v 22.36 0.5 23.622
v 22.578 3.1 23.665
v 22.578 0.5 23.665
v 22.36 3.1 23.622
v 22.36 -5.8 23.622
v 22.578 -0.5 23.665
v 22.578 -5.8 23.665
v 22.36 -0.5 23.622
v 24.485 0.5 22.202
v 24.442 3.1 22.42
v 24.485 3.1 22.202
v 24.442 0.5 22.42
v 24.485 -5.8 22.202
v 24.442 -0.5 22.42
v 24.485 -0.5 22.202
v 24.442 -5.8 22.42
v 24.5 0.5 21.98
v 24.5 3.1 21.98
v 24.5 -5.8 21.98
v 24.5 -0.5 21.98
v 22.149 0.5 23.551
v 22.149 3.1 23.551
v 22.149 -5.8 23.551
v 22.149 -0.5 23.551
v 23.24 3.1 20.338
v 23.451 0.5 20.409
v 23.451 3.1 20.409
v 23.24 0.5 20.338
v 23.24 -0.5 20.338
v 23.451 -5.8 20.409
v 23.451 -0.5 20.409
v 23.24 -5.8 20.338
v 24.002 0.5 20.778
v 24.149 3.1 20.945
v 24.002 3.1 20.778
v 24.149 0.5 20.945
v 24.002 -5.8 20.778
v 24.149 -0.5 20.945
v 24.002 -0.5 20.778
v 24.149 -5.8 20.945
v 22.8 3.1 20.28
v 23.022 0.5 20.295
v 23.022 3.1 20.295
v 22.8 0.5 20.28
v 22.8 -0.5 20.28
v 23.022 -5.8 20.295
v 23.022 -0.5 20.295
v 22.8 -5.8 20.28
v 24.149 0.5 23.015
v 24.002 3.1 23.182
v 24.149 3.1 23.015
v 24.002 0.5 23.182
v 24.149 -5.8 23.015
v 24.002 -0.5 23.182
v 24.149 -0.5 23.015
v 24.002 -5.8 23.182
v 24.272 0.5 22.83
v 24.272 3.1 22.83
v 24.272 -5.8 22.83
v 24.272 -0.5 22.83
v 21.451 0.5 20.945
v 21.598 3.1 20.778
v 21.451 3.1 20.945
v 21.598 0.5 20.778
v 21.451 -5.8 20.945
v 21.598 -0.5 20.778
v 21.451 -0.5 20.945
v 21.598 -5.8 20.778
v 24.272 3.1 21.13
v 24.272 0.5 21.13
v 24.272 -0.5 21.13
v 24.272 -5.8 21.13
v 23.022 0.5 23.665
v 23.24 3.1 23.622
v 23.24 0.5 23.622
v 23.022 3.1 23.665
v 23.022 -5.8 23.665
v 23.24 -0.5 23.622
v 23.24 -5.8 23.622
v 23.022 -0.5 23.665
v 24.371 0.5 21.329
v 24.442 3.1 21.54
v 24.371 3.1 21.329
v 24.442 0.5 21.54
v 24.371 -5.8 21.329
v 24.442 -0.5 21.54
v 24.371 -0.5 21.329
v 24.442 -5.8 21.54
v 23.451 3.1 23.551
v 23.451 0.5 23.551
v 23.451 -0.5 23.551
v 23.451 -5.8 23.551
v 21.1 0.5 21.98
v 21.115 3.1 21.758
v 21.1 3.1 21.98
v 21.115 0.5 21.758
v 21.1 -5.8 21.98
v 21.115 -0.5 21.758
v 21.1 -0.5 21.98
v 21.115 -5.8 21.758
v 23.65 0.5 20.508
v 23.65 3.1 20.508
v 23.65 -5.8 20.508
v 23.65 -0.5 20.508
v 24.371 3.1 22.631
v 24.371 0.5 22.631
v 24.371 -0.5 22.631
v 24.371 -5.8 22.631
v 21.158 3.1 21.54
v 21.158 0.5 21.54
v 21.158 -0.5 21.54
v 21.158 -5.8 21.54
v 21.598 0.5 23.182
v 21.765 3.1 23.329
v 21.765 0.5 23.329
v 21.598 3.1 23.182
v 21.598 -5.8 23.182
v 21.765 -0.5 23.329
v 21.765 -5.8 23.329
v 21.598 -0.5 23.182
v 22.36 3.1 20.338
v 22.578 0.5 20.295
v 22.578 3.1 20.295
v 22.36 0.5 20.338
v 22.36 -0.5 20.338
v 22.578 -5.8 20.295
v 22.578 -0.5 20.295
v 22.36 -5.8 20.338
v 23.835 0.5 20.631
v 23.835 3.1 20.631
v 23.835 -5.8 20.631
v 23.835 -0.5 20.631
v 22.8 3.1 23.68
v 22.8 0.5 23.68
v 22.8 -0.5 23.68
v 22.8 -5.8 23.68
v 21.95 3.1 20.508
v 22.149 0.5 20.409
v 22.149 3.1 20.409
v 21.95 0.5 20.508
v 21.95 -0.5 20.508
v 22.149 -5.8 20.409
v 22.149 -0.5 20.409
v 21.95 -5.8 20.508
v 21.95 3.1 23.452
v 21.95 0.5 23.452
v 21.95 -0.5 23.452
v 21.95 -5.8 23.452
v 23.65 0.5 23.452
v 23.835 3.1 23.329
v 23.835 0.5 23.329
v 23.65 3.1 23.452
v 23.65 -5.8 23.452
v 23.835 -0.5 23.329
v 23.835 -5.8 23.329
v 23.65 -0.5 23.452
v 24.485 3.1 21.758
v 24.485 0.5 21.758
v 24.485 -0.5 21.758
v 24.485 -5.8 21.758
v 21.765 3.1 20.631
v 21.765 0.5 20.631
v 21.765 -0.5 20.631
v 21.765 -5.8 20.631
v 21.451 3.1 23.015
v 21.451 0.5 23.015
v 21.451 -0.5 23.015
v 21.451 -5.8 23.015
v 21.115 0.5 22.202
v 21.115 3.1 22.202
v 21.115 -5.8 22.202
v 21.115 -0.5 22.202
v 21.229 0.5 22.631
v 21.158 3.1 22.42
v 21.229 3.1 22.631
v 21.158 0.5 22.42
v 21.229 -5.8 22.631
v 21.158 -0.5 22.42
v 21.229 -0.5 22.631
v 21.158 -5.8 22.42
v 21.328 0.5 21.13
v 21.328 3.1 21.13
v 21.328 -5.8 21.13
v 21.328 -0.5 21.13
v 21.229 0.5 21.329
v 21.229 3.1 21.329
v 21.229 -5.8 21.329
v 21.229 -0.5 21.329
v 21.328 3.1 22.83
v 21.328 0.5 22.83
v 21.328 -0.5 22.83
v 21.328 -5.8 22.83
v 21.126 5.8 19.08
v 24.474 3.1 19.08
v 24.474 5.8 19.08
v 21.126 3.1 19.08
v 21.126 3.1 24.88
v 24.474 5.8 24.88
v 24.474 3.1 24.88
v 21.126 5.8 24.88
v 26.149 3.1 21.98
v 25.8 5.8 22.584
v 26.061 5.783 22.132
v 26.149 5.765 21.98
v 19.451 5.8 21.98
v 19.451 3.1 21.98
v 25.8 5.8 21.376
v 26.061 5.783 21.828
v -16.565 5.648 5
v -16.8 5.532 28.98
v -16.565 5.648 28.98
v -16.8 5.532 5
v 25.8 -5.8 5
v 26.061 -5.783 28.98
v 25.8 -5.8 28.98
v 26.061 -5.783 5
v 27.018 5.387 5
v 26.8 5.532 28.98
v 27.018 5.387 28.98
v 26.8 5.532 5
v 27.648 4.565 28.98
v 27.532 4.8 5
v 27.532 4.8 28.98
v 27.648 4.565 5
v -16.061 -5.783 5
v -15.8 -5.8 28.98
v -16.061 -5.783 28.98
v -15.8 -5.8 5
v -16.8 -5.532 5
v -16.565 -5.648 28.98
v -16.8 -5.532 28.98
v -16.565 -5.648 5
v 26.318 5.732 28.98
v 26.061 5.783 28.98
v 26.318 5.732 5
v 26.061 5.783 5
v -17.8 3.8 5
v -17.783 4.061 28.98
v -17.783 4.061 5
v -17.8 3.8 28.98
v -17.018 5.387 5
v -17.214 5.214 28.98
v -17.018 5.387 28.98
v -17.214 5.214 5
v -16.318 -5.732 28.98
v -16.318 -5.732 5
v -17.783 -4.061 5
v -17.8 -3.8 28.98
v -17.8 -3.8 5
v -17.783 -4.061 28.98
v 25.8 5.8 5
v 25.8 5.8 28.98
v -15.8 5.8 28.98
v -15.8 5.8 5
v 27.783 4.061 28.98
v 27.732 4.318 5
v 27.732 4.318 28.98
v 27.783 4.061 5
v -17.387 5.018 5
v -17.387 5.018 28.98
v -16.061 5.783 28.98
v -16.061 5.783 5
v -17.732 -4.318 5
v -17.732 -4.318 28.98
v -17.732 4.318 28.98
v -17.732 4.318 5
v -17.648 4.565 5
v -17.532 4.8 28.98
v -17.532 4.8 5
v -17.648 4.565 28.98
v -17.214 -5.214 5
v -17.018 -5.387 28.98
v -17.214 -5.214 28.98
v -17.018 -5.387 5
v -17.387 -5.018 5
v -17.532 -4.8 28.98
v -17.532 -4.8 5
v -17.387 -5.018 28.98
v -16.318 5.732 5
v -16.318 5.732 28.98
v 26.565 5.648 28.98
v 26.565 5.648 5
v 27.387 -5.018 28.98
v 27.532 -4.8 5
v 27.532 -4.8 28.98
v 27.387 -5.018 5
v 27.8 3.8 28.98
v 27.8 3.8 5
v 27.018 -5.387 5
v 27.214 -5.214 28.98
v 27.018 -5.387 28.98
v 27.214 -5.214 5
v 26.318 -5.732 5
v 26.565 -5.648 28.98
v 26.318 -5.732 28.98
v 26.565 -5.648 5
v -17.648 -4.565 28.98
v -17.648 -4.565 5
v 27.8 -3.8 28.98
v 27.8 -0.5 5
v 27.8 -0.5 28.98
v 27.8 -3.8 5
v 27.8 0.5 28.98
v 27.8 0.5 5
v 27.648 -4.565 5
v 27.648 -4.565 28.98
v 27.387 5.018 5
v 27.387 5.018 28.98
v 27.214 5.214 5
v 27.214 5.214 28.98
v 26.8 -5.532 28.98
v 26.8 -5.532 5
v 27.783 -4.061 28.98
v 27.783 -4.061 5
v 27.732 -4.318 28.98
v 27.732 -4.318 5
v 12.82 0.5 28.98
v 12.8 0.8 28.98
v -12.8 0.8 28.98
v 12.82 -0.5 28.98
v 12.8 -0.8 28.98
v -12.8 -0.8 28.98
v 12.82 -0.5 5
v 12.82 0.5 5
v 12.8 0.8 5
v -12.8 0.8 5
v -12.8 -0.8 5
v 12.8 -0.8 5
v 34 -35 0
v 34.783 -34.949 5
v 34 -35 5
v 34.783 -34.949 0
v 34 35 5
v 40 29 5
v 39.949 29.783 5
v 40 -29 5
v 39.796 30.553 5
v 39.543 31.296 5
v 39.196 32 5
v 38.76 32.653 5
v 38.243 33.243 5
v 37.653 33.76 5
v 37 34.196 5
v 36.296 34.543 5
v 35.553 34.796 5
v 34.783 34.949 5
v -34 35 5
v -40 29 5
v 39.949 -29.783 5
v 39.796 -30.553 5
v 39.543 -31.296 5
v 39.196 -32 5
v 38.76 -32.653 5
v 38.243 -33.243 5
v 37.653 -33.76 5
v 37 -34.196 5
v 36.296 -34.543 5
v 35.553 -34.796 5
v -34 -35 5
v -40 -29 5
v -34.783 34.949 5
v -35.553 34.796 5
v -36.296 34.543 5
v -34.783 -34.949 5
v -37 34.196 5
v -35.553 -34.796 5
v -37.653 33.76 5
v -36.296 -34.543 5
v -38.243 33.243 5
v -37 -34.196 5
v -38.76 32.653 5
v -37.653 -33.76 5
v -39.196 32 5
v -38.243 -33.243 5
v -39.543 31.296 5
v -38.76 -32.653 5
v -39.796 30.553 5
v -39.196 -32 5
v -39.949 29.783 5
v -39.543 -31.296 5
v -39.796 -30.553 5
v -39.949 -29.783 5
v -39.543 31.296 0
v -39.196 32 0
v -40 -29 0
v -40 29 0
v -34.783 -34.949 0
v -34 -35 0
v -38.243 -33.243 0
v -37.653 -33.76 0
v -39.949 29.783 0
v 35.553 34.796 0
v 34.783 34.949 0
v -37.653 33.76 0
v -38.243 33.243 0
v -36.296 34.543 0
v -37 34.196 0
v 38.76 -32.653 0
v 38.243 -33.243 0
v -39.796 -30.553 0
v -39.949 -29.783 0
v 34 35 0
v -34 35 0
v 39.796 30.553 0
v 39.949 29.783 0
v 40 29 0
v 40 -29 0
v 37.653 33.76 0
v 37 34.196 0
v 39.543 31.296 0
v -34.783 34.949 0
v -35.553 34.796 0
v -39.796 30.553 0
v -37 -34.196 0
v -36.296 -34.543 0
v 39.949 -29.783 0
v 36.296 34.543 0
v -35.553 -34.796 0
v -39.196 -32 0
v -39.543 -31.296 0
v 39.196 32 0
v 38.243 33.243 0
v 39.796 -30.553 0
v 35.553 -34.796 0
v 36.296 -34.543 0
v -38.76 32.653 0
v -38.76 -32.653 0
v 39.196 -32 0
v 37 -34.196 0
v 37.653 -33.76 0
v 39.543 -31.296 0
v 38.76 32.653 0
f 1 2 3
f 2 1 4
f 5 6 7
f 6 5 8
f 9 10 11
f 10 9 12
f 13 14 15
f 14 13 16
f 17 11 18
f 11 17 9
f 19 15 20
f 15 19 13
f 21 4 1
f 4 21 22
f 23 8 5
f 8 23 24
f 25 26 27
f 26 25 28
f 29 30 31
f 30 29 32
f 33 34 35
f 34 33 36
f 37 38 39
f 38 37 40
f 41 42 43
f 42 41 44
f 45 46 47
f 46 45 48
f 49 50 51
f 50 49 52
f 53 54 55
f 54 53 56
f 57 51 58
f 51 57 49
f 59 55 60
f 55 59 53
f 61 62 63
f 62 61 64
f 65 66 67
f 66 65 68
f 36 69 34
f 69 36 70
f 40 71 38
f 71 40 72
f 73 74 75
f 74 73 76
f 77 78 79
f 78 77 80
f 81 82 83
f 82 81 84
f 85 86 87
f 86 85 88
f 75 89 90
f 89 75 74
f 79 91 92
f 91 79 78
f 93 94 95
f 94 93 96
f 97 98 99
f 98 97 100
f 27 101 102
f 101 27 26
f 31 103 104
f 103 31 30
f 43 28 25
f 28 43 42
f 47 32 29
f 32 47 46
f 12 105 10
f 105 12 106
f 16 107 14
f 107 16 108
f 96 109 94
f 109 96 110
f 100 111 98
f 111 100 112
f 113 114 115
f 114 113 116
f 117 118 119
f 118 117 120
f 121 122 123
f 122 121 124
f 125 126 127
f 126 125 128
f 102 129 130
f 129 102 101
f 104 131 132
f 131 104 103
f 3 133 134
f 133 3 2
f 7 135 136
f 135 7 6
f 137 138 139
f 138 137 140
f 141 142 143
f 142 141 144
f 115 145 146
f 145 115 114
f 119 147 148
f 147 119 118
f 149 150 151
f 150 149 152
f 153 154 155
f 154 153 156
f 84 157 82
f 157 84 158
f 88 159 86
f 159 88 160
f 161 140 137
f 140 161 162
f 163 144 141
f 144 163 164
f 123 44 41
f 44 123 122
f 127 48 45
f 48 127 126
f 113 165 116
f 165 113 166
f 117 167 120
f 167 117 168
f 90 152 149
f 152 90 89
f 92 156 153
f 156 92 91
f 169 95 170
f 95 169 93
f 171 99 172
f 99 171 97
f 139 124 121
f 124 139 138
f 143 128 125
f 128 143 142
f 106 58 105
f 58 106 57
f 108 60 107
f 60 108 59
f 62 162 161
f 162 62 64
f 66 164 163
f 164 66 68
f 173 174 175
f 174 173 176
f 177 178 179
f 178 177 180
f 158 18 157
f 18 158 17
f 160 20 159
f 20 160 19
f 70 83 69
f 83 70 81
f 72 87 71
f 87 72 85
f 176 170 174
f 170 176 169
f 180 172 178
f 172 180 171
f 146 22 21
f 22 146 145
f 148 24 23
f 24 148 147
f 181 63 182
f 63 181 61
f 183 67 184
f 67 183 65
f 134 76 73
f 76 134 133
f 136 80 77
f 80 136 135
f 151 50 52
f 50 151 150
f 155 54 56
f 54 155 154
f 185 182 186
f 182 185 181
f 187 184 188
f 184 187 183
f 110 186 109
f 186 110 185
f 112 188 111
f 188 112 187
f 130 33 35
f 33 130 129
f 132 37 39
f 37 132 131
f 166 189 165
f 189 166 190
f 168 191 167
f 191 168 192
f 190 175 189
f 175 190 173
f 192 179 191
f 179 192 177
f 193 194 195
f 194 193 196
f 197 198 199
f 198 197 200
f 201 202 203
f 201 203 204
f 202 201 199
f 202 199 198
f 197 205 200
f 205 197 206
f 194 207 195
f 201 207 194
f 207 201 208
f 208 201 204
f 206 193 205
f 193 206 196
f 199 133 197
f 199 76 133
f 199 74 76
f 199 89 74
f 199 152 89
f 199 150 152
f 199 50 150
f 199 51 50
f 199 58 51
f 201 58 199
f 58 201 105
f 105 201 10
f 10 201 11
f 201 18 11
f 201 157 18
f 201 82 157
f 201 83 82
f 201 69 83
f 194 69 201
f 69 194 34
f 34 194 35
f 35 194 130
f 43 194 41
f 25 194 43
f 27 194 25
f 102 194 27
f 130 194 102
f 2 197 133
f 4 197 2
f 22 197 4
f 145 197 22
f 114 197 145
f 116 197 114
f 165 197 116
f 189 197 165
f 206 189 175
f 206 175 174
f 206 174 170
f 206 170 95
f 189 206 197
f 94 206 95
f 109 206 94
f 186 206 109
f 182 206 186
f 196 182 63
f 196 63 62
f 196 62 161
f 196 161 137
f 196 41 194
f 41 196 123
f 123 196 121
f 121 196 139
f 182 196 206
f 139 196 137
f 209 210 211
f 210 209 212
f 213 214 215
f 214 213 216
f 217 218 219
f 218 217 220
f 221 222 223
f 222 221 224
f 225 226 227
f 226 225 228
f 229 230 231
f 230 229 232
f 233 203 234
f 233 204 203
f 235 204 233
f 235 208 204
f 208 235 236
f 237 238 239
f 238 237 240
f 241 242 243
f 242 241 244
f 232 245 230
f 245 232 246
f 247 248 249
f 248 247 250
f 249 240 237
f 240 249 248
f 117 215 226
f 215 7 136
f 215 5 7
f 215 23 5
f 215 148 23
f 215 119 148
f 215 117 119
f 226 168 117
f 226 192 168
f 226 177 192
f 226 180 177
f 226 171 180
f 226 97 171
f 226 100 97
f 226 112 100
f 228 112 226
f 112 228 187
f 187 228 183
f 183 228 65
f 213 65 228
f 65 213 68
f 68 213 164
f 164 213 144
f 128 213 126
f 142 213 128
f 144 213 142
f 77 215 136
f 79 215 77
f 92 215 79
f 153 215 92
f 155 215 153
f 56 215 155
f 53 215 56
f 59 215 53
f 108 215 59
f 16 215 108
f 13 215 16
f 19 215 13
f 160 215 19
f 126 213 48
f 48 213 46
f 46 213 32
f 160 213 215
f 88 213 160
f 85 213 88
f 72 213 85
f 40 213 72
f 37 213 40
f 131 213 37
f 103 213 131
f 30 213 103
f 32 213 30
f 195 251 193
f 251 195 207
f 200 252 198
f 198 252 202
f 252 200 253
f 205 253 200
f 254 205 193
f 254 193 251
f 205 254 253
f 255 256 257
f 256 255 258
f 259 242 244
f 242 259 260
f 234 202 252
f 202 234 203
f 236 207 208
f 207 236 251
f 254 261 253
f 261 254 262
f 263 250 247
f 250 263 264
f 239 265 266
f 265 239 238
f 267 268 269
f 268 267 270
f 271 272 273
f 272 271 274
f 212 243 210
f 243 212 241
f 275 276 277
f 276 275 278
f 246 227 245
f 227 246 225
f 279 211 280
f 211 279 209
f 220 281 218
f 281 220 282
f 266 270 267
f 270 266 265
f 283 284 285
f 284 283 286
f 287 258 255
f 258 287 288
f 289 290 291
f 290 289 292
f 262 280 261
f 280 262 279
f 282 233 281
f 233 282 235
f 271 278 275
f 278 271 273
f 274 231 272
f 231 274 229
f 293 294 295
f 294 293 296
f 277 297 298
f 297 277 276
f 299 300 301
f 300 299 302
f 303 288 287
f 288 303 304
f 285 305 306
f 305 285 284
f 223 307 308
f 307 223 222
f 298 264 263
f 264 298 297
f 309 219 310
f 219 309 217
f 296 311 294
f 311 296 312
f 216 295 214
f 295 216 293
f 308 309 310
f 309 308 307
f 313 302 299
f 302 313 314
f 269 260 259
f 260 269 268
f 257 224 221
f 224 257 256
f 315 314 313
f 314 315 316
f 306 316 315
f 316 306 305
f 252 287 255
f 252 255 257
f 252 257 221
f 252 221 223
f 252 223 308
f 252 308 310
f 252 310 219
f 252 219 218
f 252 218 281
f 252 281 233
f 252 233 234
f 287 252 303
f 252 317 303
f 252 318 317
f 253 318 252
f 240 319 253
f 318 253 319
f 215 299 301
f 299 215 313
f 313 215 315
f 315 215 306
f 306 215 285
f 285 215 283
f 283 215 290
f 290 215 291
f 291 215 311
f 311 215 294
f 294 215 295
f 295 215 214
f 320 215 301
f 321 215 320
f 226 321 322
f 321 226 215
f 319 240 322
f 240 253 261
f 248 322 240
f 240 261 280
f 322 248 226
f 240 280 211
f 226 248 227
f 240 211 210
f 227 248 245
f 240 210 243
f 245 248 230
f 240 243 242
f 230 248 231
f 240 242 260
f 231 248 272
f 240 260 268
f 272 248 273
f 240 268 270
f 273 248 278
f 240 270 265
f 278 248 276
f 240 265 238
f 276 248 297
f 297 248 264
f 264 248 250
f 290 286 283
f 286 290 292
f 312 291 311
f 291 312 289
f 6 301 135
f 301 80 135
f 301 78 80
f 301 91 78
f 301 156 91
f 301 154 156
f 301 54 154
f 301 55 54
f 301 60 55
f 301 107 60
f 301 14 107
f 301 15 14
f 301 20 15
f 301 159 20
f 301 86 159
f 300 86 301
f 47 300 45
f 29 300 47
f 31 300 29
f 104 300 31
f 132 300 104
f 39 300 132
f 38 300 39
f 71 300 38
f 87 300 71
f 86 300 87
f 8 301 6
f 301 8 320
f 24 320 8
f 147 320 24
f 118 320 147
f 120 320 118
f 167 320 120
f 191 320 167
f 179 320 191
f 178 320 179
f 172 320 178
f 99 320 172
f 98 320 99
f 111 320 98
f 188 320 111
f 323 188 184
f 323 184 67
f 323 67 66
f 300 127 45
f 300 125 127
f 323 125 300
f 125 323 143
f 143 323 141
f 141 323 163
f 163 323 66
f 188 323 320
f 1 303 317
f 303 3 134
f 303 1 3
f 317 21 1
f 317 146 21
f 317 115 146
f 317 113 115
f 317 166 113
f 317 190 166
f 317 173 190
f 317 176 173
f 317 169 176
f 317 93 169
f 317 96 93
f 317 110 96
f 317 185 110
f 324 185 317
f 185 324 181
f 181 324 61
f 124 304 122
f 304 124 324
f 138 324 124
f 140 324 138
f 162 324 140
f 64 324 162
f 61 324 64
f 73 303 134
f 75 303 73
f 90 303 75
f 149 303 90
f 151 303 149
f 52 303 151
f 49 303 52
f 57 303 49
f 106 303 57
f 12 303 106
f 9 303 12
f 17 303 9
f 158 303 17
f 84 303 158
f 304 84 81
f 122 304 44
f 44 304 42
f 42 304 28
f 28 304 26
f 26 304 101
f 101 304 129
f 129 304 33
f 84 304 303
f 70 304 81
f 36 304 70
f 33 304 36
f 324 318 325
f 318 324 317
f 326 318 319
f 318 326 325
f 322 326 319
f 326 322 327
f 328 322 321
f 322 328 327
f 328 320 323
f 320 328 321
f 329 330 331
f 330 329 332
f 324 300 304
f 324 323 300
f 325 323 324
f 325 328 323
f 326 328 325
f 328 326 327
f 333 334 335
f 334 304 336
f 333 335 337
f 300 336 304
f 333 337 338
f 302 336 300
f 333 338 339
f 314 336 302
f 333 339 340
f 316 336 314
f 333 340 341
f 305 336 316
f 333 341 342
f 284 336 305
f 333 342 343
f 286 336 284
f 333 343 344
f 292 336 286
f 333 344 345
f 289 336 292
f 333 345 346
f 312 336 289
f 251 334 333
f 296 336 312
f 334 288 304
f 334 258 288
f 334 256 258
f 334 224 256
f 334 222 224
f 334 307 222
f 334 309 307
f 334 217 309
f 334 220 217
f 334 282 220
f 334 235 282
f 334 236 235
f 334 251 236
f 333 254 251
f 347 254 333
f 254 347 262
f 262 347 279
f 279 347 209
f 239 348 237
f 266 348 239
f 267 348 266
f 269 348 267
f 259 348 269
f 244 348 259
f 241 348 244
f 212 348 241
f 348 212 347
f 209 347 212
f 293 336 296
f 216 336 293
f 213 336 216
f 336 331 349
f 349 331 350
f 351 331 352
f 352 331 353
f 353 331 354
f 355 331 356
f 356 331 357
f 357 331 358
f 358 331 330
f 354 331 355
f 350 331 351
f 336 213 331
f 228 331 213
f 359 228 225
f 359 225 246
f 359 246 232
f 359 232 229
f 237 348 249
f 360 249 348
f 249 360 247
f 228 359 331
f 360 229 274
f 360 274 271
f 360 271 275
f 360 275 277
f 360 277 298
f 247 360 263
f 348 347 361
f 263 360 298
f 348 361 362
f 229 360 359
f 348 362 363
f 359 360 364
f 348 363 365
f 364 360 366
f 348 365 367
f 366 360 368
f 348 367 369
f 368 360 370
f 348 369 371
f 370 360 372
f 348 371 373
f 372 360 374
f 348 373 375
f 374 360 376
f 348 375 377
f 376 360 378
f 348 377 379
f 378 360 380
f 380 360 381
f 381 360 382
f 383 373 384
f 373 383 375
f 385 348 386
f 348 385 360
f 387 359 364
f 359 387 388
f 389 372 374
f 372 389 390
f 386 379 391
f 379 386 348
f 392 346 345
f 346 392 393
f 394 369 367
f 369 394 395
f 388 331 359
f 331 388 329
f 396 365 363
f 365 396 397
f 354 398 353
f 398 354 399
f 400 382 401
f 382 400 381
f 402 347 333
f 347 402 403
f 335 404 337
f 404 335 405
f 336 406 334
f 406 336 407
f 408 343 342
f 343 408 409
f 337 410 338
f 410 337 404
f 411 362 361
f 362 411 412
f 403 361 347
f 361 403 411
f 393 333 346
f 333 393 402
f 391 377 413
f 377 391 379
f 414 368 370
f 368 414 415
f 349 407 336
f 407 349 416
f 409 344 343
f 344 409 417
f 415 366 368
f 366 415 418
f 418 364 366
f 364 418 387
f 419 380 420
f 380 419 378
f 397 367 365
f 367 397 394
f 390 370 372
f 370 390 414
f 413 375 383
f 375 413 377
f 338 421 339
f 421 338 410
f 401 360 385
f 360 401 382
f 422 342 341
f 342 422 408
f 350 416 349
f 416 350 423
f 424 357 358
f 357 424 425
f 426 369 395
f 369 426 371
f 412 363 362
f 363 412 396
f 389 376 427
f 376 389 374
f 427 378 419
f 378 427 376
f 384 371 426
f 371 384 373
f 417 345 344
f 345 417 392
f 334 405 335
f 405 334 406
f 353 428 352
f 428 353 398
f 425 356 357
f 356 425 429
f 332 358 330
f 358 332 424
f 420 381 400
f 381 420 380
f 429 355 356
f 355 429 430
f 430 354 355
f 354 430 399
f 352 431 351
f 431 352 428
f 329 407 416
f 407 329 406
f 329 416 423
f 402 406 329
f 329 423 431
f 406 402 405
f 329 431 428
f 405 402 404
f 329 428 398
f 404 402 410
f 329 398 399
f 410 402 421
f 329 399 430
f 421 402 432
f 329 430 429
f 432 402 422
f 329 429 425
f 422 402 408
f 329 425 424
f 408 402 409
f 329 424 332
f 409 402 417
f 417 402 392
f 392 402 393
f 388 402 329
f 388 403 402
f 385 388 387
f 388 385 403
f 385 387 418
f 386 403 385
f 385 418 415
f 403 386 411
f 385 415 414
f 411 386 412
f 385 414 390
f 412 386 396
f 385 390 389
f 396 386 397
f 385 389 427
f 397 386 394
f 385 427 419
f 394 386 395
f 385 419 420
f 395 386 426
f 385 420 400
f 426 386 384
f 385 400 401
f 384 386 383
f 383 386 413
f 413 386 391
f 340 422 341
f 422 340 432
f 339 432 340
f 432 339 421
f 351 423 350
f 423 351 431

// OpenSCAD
// Example dimensions only; measure the ruler, screws and nuts before printing.
// Units: mm. The ruler's readable scale faces -Y; its length runs along +Z.
part = "foot"; // foot, cursor, socket_coupon
ruler_width = 25;
ruler_thickness = 1;
ruler_length = 150;
socket_clearance = 0.30; // per side, before clamping
cursor_clearance = 0.35; // per side, before clamping
socket_engagement = 24;
minimum_ruler_engagement = 16; // actual insertion; example allows at most 8 mm lift
minimum_exposed_scale = 80;
base_width = 80;
base_depth = 70;
base_thickness = 5;
base_corner_radius = 6;
socket_wall = 5;
socket_corner_radius = 2;
ear_extension = 10;
split_gap = 1.0;
socket_screw_height = 17; // above base top
cursor_height = 12;
cursor_wall = 4.2;
cursor_edge_width = 2;
cursor_reference_offset = 1.2; // lower window edge above cursor bottom
cursor_top_beam = 1.8;
screw_hole_diameter = 3.4;
nut_across_flats = 5.8;
nut_depth = 2.7;
minimum_wall = 1.2;
coupon_margin = 2;
coupon_base_thickness = 3;
show_reference = false; // background ruler excluded from STL
epsilon = 0.02;
$fn = 48;

socket_slot_width = ruler_width + 2 * socket_clearance;
socket_slot_thickness = ruler_thickness + 2 * socket_clearance;
socket_depth = socket_slot_thickness + 2 * socket_wall;
socket_left = -socket_slot_width/2 - socket_wall;
socket_right = socket_slot_width/2 + socket_wall + ear_extension;
socket_screw_x = socket_slot_width/2 + socket_wall + ear_extension/2;
cursor_slot_width = ruler_width + 2 * cursor_clearance;
cursor_slot_thickness = ruler_thickness + 2 * cursor_clearance;
cursor_depth = cursor_slot_thickness + 2 * cursor_wall;
cursor_left = -cursor_slot_width/2 - cursor_wall;
cursor_right = cursor_slot_width/2 + cursor_wall + ear_extension;
cursor_screw_x = cursor_slot_width/2 + cursor_wall + ear_extension/2;
nut_radius = nut_across_flats / sqrt(3);
cursor_window_width = cursor_slot_width - 2 * cursor_edge_width;

assert(part == "foot" || part == "cursor" || part == "socket_coupon", "Unknown part selector");
assert(ruler_width > 0 && ruler_thickness > 0 && ruler_length > 0,
       "Ruler dimensions must be positive");
assert(socket_clearance >= 0 && cursor_clearance >= 0,
       "Fit clearances must be nonnegative");
assert(minimum_wall >= 1 && socket_wall >= nut_depth + minimum_wall &&
       cursor_wall >= nut_depth + minimum_wall, "Walls must retain nut pocket material");
assert(screw_hole_diameter > 0 && nut_depth > 0 &&
       nut_across_flats >= screw_hole_diameter + 2 * minimum_wall,
       "Nut capture must surround screw hole");
assert(ear_extension/2 >= nut_radius + minimum_wall,
       "Clamp ears must surround nut pocket");
assert(split_gap > 2 * max(socket_clearance, cursor_clearance) &&
       split_gap <= min(socket_slot_thickness, cursor_slot_thickness),
       "Split gap must join slots with bounded closure travel");
assert(socket_engagement >= 2 * (nut_radius + minimum_wall) &&
       socket_screw_height >= nut_radius + minimum_wall &&
       socket_engagement - socket_screw_height >= nut_radius + minimum_wall,
       "Socket engagement must retain screw margins");
assert(minimum_ruler_engagement <= socket_engagement &&
       minimum_ruler_engagement >= socket_engagement - socket_screw_height + nut_radius + minimum_wall,
       "Minimum insertion must cover clamping screw station");
assert(minimum_exposed_scale > 0 && ruler_length - socket_engagement >= minimum_exposed_scale,
       "Ruler must leave required exposed scale");
assert(base_thickness >= minimum_wall && base_width/2 >= max(-socket_left, socket_right) + minimum_wall &&
       base_depth/2 >= socket_depth/2 + minimum_wall,
       "Base must support socket with positive margins");
assert(base_corner_radius > 0 && base_corner_radius < min(base_width, base_depth)/2 &&
       socket_corner_radius > 0 && socket_corner_radius <= minimum_wall + 1,
       "Corner radii must preserve socket and base");
assert(cursor_height/2 >= nut_radius + minimum_wall &&
       cursor_reference_offset >= minimum_wall && cursor_top_beam >= minimum_wall &&
       cursor_height - cursor_reference_offset - cursor_top_beam >= 2 * minimum_wall &&
       cursor_edge_width >= minimum_wall && cursor_window_width >= 2 * minimum_wall,
       "Cursor window must preserve reference edge and screw margins");
assert(coupon_margin >= minimum_wall && coupon_base_thickness >= minimum_wall,
       "Coupon base must retain positive margins");

module rounded_block(width, depth, height, radius) {
    assert(width > 2*radius && depth > 2*radius,
           "Rounded block must retain positive inner profile");
    linear_extrude(height)
        offset(r=radius)
            square([width - 2*radius, depth - 2*radius], center=true);
}

// Both screws pull opposing jaws together outside the ruler envelope.
// Rear-face hex pocket is open for nut insertion/removal; front head stays exposed.
module clamp_hardware_voids(x, depth, z) {
    translate([x, 0, z]) rotate([90, 0, 0])
        cylinder(h=depth + 2*epsilon, d=screw_hole_diameter, center=true);
    translate([x, depth/2 - nut_depth/2 + epsilon/2, z]) rotate([90, 0, 0])
        cylinder(h=nut_depth + epsilon, r=nut_radius, $fn=6, center=true);
}

// A small transition bevel avoids collinear floor facets at the slot/split
// junction. It only relieves the off-ruler edge of the aperture.
module ruler_aperture(width, thickness, right, height) {
    translate([0, 0, -epsilon])
        linear_extrude(height + 2*epsilon)
            if (split_gap == thickness) {
                translate([-width/2, -thickness/2])
                    square([right + epsilon + width/2, thickness]);
            } else {
                polygon([
                    [-width/2, -thickness/2], [width/2, -thickness/2],
                    [width/2 + epsilon, -split_gap/2], [right + epsilon, -split_gap/2],
                    [right + epsilon, split_gap/2], [width/2 + epsilon, split_gap/2],
                    [width/2, thickness/2], [-width/2, thickness/2]
                ]);
            }
}

module socket() {
    difference() {
        translate([(socket_left + socket_right)/2, 0, 0])
            rounded_block(socket_right - socket_left, socket_depth,
                          socket_engagement, socket_corner_radius);
        ruler_aperture(socket_slot_width, socket_slot_thickness,
                       socket_right, socket_engagement);
        clamp_hardware_voids(socket_screw_x, socket_depth, socket_screw_height);
    }
}

module foot() {
    union() {
        rounded_block(base_width, base_depth, base_thickness, base_corner_radius);
        // Small overlap removes coplanar ambiguity while preserving slot floor.
        translate([0, 0, base_thickness - epsilon]) socket();
    }
}

module socket_coupon() {
    union() {
        translate([socket_left - coupon_margin, -socket_depth/2 - coupon_margin, 0])
            cube([socket_right - socket_left + 2*coupon_margin,
                  socket_depth + 2*coupon_margin, coupon_base_thickness]);
        translate([0, 0, coupon_base_thickness - epsilon]) socket();
    }
}

module cursor() {
    difference() {
        translate([cursor_left, -cursor_depth/2, 0])
            cube([cursor_right - cursor_left, cursor_depth, cursor_height]);
        // Through-slot: cursor is placed over a free ruler end, then slid to neutral.
        ruler_aperture(cursor_slot_width, cursor_slot_thickness,
                       cursor_right, cursor_height);
        // Open front window. Its lower edge is the sole reference edge.
        translate([-cursor_window_width/2, -cursor_depth/2 - epsilon, cursor_reference_offset])
            cube([cursor_window_width, cursor_wall + 2*epsilon,
                  cursor_height - cursor_reference_offset - cursor_top_beam]);
        clamp_hardware_voids(cursor_screw_x, cursor_depth, cursor_height/2);
    }
}

if (part == "foot") foot();
if (part == "cursor") cursor();
if (part == "socket_coupon") socket_coupon();

if (show_reference) {
    ruler_z = part == "cursor" ? -20 :
              part == "socket_coupon" ? coupon_base_thickness : base_thickness;
    %translate([-ruler_width/2, -ruler_thickness/2, ruler_z])
        cube([ruler_width, ruler_thickness, ruler_length]);
}
